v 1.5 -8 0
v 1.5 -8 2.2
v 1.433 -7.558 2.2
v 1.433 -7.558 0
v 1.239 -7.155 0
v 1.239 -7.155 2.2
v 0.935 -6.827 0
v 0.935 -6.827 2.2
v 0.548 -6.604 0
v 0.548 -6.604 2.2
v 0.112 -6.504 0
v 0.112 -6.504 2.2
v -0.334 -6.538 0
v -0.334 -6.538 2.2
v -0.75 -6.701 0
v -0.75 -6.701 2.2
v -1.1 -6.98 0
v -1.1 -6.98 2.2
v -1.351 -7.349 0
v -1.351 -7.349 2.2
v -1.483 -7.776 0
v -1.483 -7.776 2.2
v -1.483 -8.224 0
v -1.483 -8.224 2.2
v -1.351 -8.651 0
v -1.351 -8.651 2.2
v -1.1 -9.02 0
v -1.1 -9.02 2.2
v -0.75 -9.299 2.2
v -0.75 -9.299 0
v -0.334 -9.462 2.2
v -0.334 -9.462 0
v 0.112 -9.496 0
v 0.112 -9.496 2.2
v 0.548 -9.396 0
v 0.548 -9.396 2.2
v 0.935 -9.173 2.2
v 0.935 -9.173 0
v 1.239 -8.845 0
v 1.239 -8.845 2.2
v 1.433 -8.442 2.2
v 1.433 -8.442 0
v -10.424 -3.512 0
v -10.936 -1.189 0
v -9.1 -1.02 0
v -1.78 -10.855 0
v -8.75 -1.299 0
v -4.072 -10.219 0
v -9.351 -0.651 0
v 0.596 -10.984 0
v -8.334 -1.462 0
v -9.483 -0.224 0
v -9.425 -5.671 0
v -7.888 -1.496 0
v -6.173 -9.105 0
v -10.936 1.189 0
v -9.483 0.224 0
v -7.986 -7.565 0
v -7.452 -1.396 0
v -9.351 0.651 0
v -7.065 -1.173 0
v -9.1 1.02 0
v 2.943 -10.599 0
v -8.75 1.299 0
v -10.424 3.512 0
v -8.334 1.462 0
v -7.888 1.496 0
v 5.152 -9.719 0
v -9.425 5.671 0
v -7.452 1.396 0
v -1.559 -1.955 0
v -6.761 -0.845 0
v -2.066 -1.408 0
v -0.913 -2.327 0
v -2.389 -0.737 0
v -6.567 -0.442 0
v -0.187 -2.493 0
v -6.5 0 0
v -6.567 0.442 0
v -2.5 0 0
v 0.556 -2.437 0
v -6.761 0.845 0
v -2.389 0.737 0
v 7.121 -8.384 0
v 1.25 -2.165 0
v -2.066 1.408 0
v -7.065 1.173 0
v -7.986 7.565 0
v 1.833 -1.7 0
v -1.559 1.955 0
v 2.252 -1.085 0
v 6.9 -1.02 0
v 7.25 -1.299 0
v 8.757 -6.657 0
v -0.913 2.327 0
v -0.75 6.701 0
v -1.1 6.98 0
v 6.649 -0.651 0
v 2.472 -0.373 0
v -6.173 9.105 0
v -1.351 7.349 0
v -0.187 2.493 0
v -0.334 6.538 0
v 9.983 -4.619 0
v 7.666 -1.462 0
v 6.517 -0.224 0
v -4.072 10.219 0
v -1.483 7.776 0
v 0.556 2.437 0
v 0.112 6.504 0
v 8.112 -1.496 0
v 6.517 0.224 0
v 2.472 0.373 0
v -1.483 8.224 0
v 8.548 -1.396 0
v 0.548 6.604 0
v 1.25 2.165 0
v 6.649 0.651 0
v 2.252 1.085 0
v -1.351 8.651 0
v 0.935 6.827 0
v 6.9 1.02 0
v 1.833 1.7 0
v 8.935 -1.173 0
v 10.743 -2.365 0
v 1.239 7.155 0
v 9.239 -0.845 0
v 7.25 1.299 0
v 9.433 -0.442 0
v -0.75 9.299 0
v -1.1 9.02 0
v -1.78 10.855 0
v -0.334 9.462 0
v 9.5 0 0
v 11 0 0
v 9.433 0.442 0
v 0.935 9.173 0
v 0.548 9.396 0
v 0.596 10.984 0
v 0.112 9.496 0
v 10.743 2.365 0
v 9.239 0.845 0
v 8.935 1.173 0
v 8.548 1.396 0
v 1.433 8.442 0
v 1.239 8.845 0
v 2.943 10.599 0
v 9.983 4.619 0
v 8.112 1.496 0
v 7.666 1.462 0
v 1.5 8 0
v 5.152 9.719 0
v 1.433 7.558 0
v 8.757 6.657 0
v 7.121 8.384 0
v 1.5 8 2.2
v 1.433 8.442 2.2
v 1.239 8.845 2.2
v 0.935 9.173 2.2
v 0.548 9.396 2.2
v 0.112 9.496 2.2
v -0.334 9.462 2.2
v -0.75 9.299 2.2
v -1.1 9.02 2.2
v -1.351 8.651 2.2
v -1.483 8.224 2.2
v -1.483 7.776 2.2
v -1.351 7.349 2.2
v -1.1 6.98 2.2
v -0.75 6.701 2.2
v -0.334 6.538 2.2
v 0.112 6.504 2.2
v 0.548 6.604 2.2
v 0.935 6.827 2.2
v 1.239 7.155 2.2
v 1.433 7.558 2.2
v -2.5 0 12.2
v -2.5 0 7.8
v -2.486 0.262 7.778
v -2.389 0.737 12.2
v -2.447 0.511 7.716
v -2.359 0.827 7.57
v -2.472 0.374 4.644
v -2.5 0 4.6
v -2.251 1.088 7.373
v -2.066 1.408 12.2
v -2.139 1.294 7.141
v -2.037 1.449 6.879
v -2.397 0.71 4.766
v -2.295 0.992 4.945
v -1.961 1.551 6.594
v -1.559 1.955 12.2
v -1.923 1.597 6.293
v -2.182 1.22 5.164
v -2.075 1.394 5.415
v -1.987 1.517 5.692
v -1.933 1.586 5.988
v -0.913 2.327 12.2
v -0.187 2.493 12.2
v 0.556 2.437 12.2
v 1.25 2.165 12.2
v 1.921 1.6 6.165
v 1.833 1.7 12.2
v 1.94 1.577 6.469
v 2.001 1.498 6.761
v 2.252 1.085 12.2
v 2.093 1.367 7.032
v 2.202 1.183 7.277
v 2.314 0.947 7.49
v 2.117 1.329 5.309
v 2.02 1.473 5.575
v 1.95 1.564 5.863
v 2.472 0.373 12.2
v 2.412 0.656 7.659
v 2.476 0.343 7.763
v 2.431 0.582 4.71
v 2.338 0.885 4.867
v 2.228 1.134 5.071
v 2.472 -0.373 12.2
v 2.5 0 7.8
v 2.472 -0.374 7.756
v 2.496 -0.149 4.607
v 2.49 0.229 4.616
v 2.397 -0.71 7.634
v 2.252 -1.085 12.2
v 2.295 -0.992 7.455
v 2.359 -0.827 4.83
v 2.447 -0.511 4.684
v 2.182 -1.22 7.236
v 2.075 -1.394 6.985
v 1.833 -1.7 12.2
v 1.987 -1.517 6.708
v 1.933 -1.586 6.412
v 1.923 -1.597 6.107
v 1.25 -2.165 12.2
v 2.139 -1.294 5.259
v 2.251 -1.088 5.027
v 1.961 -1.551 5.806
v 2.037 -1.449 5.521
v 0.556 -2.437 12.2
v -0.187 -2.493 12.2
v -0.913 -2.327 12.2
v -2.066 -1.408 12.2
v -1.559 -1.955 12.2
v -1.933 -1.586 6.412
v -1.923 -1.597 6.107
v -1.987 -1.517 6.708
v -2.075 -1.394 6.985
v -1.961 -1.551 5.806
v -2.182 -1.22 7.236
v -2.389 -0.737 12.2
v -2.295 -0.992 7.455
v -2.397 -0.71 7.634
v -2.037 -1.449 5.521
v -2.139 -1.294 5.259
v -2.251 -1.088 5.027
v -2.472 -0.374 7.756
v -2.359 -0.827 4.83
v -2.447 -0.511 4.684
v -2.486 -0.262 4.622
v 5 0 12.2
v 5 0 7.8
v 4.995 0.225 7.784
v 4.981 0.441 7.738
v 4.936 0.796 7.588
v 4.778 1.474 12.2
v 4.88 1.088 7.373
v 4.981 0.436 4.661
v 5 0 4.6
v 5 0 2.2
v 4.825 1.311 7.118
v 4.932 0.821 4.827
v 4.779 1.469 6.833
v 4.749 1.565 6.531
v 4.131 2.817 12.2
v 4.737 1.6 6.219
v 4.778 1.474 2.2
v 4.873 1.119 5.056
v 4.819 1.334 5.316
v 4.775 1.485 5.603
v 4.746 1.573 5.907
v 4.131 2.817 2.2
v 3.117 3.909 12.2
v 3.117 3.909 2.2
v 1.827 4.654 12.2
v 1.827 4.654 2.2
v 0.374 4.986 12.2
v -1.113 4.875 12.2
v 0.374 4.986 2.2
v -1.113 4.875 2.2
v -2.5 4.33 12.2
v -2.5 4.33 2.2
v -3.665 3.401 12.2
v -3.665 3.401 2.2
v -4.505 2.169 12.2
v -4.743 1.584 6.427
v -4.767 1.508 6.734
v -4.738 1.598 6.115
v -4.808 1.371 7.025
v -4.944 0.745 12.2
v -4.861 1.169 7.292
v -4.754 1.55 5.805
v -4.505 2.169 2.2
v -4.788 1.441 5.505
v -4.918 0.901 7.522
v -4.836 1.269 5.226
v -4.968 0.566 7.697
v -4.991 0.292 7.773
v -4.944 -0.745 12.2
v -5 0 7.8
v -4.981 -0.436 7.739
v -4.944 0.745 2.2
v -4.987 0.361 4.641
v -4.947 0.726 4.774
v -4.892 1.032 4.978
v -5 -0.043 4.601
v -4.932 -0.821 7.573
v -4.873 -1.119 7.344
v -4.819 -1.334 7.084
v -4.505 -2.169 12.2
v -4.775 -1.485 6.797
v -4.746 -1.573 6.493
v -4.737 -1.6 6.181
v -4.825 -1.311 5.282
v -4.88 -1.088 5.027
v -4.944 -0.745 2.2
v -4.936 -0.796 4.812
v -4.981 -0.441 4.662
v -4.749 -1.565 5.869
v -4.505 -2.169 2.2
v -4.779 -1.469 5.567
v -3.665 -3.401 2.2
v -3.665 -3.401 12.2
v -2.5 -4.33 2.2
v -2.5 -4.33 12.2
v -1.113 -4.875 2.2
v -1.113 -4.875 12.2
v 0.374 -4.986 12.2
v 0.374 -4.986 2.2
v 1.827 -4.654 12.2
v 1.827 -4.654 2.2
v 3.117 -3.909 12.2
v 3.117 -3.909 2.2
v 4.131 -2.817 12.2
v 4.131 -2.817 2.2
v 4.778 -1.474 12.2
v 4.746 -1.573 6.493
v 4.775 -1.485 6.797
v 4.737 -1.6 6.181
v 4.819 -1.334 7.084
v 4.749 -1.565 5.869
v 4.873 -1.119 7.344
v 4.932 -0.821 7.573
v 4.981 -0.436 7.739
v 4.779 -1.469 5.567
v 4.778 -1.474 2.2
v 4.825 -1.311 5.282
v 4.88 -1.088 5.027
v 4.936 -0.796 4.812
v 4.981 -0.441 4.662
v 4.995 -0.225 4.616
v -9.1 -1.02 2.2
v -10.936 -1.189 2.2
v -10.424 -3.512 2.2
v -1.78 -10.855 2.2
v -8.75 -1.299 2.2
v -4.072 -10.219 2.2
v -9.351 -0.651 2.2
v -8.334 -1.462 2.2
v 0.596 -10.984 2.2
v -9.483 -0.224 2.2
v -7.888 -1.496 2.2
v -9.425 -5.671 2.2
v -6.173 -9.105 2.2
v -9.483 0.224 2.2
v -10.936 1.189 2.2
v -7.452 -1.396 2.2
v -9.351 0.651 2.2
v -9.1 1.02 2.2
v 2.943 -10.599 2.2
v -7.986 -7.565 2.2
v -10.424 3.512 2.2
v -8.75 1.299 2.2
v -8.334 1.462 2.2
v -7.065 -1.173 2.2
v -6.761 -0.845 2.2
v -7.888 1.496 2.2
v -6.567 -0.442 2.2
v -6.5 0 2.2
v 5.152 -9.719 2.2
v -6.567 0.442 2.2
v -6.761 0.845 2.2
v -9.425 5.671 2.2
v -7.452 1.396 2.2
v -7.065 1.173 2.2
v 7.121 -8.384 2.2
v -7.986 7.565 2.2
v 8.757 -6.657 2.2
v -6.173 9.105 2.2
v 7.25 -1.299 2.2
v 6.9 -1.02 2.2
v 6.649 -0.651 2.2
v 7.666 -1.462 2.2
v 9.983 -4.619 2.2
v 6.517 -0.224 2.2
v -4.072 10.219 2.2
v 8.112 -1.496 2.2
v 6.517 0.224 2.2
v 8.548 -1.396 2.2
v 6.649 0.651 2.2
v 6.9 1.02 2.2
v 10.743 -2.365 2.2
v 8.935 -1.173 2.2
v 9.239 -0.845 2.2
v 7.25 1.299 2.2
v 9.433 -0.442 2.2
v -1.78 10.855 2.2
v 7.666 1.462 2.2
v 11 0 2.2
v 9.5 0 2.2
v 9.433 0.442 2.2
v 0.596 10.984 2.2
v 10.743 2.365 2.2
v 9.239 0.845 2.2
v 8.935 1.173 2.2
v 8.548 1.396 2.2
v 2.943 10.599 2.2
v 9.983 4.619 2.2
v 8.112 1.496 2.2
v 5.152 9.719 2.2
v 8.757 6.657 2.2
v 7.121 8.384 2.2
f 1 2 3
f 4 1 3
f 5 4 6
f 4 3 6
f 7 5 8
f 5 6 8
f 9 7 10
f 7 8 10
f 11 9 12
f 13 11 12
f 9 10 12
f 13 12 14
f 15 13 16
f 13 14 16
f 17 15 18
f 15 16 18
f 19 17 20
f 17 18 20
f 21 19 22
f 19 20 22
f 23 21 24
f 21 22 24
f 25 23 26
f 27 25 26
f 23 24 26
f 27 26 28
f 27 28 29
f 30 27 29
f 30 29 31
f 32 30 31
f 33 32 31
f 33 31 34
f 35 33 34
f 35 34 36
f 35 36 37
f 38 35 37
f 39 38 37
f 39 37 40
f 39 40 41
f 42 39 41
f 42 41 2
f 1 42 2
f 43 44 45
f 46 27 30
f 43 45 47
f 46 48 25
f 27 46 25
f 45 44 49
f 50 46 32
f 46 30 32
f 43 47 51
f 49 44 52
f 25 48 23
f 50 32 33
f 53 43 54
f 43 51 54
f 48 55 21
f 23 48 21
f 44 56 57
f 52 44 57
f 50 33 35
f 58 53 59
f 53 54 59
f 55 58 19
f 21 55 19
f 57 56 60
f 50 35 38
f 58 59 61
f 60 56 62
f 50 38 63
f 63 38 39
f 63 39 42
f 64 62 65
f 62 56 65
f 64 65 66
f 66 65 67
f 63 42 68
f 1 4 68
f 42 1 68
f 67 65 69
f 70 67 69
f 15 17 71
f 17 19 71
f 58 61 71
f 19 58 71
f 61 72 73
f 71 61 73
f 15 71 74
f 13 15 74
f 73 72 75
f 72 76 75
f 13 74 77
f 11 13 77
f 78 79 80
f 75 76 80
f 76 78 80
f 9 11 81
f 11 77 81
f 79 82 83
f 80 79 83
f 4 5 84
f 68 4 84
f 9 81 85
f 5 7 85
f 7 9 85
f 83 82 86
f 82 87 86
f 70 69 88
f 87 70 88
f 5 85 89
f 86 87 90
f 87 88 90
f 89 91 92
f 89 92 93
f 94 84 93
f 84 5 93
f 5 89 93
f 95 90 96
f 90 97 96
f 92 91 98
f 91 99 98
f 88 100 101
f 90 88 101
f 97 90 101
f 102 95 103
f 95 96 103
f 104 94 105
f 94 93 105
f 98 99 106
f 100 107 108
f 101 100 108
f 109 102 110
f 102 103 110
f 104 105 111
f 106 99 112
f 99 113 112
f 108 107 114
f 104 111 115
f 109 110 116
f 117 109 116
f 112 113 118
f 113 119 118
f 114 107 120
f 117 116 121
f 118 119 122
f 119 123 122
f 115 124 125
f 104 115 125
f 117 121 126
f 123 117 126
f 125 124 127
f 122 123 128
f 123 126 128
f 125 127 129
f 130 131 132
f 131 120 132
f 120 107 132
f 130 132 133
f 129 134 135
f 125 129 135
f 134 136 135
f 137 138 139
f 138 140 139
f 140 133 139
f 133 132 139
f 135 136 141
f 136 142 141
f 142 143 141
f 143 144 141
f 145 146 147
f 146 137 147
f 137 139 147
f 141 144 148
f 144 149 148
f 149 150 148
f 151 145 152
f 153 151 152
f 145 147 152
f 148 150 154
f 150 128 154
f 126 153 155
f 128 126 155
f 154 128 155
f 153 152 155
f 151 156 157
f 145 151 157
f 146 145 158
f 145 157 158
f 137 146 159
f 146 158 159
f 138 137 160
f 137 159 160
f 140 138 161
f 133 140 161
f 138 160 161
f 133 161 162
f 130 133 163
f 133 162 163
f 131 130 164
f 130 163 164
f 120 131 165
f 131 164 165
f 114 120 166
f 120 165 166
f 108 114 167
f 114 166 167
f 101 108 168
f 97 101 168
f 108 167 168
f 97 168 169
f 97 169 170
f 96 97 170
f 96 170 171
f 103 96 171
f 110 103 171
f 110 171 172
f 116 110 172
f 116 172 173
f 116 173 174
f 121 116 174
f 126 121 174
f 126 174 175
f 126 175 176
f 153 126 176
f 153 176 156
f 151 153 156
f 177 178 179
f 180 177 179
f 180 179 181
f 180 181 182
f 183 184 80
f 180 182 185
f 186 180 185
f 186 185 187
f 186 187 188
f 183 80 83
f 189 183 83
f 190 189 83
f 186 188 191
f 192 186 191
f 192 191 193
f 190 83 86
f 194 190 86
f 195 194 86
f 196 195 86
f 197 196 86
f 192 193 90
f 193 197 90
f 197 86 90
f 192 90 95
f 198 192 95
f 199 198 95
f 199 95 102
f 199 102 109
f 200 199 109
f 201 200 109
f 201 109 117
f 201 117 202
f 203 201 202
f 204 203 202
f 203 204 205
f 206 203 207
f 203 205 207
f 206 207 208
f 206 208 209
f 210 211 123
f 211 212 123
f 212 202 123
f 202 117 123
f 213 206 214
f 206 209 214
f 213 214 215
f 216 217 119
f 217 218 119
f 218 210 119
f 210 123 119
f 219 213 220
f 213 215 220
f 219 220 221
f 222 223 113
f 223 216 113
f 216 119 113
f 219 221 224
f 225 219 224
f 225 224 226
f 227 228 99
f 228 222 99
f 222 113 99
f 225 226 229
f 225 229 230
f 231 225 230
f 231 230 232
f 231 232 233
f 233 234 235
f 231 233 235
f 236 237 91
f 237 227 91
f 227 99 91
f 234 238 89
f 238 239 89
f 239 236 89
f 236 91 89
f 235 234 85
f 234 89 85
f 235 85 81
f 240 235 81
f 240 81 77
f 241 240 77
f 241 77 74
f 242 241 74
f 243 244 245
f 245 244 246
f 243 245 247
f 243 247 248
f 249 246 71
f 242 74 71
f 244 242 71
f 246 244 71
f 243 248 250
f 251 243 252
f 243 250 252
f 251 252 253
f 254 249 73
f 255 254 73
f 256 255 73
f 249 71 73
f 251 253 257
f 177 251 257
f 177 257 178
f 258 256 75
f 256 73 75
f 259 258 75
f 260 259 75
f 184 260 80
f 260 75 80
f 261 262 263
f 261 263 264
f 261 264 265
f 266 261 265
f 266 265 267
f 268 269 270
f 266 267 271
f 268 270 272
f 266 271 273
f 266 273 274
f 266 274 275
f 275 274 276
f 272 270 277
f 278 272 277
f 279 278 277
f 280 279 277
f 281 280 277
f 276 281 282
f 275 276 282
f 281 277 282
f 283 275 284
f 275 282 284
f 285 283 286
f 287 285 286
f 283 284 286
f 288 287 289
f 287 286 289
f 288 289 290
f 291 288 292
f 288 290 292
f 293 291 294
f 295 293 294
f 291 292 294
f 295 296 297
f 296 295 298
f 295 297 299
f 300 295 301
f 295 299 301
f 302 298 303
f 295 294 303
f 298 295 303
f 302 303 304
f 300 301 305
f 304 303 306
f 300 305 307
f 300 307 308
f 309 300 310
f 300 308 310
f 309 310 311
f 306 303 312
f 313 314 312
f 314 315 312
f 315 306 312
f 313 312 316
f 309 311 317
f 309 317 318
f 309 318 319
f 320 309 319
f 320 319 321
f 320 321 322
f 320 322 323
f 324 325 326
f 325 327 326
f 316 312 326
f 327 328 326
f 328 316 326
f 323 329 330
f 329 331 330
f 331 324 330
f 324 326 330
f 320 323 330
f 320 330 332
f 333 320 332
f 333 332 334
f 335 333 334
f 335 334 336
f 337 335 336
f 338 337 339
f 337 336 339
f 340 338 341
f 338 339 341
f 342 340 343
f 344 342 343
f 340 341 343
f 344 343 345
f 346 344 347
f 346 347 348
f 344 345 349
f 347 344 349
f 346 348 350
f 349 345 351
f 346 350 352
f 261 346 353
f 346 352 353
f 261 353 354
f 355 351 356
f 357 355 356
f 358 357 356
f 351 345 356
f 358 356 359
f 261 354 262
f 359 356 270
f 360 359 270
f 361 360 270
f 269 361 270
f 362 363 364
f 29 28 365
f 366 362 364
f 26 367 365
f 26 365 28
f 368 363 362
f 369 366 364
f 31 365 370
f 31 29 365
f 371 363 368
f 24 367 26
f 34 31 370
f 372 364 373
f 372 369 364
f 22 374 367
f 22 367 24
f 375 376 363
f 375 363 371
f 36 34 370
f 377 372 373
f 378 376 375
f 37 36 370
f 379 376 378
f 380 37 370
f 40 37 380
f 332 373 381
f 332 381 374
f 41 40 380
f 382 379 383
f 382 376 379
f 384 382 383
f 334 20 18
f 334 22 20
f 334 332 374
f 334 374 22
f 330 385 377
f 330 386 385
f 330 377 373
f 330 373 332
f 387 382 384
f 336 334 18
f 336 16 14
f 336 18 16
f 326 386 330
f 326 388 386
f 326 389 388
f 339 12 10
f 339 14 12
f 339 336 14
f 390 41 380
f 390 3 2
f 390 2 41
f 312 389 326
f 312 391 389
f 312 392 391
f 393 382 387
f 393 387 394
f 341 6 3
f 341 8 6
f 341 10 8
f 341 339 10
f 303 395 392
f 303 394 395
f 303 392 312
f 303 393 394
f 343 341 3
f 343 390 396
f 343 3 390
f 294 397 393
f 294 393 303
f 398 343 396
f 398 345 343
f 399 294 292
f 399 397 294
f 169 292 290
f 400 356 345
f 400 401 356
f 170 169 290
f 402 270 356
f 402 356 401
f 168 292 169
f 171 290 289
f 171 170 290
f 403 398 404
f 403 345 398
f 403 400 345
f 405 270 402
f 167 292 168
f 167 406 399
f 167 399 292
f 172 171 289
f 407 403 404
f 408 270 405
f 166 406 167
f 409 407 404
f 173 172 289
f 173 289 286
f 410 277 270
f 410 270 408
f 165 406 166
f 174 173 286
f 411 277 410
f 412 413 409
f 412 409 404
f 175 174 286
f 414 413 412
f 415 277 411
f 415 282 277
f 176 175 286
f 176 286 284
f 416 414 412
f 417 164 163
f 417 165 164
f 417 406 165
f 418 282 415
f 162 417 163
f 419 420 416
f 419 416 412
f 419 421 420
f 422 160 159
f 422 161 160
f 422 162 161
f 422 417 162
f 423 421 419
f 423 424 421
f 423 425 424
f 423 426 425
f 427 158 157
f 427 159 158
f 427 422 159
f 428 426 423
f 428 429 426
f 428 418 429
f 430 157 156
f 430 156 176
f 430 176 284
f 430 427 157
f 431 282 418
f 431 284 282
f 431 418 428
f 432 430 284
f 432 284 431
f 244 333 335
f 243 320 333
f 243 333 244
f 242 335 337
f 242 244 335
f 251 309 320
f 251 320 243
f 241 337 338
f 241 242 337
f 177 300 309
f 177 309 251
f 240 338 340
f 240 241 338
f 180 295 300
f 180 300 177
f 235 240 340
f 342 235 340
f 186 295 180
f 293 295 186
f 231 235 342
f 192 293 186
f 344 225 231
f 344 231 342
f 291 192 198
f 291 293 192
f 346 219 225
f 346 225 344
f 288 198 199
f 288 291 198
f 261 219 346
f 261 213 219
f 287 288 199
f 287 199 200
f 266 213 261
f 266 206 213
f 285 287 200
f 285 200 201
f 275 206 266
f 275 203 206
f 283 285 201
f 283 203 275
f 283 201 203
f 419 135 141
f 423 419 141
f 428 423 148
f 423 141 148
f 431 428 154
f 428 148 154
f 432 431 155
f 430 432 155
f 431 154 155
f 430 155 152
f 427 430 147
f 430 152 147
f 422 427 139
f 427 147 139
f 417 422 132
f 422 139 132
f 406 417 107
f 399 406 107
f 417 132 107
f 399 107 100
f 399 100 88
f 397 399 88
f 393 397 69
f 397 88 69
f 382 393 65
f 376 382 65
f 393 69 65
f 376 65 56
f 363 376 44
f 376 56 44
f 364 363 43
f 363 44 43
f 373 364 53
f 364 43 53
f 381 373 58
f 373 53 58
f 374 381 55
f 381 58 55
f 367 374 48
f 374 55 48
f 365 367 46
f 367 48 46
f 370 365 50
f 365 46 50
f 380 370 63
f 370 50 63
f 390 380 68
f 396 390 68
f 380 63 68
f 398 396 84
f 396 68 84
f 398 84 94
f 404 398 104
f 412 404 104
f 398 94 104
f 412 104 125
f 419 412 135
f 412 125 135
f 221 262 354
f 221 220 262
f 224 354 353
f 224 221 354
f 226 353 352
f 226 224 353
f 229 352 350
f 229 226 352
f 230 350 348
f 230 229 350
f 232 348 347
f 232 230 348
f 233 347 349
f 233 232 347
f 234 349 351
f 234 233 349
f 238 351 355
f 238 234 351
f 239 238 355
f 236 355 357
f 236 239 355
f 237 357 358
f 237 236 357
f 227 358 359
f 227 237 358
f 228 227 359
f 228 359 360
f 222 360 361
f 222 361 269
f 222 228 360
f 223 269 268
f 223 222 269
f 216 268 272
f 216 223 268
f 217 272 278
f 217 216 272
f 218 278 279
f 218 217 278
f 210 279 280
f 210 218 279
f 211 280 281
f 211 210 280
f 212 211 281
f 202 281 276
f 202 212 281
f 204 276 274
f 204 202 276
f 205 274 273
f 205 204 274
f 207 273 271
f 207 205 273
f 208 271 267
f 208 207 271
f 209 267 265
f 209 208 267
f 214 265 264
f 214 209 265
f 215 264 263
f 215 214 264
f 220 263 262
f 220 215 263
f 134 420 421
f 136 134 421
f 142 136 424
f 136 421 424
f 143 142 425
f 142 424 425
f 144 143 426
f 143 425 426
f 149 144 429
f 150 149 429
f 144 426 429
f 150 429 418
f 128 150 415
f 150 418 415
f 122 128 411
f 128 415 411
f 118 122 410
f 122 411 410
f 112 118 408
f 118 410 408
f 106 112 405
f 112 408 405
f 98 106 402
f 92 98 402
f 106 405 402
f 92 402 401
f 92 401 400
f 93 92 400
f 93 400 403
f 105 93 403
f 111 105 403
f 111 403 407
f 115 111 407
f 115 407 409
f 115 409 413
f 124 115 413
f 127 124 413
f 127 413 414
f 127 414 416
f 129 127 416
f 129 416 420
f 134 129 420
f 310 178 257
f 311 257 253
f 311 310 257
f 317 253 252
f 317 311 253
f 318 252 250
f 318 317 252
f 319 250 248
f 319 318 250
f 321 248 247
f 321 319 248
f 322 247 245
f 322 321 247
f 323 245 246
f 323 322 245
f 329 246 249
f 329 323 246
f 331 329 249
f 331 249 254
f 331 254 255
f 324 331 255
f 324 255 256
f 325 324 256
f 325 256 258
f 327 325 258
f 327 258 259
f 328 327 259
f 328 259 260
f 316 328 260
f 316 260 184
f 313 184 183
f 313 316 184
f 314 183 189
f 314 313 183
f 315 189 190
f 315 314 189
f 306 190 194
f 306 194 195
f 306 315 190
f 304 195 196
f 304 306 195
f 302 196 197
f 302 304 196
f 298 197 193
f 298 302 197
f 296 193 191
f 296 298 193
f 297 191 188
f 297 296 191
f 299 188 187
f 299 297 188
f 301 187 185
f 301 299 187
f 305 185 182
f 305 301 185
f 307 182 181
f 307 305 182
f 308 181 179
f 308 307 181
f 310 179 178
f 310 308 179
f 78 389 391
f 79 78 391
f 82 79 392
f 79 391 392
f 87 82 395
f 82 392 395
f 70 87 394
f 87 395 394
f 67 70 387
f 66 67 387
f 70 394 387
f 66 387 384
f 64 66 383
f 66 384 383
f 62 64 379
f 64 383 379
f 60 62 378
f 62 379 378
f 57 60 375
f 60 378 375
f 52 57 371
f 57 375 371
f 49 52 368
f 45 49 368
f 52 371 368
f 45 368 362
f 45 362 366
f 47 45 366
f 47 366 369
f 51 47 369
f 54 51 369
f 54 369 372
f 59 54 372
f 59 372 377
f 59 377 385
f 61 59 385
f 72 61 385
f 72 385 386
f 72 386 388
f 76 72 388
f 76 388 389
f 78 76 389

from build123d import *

# Parameters (mm, degrees)
SKETCH_1_R               = 11
EXTRUDE_1_DEPTH          = 2.2
SKETCH_2_R               = 5
EXTRUDE_2_DEPTH          = 10
SKETCH_3_R               = 1.5
CUT_EXTRUDE_1_DEPTH      = 10
CUT_EXTRUDE_2_DEPTH      = 10
CUT_EXTRUDE_2_DEPTH_BACK = 10
SKETCH_4_R               = 1.6
SKETCH_5_R               = 2.5
CUT_EXTRUDE_3_DEPTH      = 50


with BuildPart() as part:
    # 草图1 → 凸台-拉伸1 (new body)
    with BuildSketch(Plane.XY):
        Circle(SKETCH_1_R)
    extrude(amount=EXTRUDE_1_DEPTH)

    # 草图2 → 凸台-拉伸2 (add)
    with BuildSketch(Plane.XY.offset(2.2)):
        Circle(SKETCH_2_R)
    extrude(amount=EXTRUDE_2_DEPTH)

    # 草图3 → 切除-拉伸1 (cut)
    with BuildSketch(Plane.XY.offset(2.2)):
        with Locations((8, 0)):
            Circle(SKETCH_3_R)
        with Locations((0, -8)):
            Circle(SKETCH_3_R)
        with Locations((-8, 0)):
            Circle(SKETCH_3_R)
        with Locations((0, 8)):
            Circle(SKETCH_3_R)
    extrude(amount=-CUT_EXTRUDE_1_DEPTH, mode=Mode.SUBTRACT)

    # 草图4 → 切除-拉伸2 (cut, two sides: drawn at the far end of the back side and taken through both)
    with BuildSketch(Plane(origin=(0, 0, 0), x_dir=(0, 0, -1), z_dir=(1, 0, 0)).offset(-CUT_EXTRUDE_2_DEPTH_BACK)):
        with Locations((-6.2, 0)):
            Circle(SKETCH_4_R)
    extrude(amount=CUT_EXTRUDE_2_DEPTH + CUT_EXTRUDE_2_DEPTH_BACK, mode=Mode.SUBTRACT)

    # 草图5 → 切除-拉伸3 (cut)
    with BuildSketch(Plane(origin=(0, 0, 0), x_dir=(-1, 0, 0), z_dir=(0, 0, -1))):
        Circle(SKETCH_5_R)
    extrude(amount=-CUT_EXTRUDE_3_DEPTH, mode=Mode.SUBTRACT)


solid = part.part
